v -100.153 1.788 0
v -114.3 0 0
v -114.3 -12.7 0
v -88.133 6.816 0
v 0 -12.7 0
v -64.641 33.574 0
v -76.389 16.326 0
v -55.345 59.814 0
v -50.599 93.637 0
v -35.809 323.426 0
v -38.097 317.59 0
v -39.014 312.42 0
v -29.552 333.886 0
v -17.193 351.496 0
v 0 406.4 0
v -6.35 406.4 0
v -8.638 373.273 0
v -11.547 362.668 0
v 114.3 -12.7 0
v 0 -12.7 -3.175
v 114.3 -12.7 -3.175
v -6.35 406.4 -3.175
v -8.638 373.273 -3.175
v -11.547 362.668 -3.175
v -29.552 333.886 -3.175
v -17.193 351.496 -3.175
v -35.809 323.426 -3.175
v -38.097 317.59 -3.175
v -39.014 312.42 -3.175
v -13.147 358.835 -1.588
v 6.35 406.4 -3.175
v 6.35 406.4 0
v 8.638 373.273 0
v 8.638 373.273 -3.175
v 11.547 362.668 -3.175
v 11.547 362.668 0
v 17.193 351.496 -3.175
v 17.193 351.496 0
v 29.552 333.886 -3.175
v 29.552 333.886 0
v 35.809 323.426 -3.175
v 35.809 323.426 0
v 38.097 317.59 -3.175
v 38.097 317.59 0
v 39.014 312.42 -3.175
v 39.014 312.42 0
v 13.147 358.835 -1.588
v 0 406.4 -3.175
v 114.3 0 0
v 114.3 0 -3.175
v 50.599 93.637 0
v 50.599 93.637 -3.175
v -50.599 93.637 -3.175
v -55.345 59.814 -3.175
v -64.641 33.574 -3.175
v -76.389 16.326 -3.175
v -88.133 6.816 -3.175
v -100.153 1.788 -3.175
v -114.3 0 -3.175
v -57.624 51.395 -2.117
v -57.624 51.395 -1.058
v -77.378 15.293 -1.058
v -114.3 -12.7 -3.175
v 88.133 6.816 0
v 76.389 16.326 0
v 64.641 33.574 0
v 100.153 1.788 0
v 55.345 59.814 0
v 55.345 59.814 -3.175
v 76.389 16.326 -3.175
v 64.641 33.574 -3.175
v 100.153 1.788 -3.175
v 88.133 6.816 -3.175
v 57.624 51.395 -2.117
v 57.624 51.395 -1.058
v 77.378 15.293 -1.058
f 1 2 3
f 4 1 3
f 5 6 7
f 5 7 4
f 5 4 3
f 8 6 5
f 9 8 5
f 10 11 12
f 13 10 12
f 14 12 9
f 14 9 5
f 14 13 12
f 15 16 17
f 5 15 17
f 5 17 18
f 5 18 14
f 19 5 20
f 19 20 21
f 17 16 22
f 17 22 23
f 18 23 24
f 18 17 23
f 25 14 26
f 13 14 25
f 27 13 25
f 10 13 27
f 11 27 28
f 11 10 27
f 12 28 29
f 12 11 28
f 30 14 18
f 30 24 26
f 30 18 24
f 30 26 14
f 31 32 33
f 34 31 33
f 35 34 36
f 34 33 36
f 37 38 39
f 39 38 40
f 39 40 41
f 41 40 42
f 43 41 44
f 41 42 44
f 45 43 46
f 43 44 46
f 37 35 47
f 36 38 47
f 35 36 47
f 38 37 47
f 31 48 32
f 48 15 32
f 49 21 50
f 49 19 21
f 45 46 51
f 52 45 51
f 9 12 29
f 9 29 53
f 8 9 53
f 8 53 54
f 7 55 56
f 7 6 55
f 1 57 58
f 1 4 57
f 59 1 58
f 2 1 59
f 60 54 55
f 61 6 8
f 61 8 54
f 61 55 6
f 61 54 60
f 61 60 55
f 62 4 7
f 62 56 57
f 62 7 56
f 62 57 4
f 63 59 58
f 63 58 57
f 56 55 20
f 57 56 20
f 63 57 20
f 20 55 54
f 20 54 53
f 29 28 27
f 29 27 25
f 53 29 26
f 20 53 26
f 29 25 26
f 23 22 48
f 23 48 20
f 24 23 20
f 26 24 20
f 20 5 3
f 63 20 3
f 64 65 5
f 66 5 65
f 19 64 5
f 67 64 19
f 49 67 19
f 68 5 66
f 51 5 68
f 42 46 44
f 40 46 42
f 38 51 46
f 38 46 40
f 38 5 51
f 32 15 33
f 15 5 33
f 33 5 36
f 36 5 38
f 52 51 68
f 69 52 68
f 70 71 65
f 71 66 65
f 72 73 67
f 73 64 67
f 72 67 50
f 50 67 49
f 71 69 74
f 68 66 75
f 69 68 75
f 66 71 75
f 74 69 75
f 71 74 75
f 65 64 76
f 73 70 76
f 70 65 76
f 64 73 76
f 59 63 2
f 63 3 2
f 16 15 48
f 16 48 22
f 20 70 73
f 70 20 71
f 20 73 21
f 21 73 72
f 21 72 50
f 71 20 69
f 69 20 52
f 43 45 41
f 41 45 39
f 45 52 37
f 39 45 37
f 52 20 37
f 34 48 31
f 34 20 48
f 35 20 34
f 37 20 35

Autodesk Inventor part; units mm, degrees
ref_plane "YZ Plane" through (0, 0, 0) normal (1, 0, 0) x (0, 1, 0)
ref_plane "XZ Plane" through (0, 0, 0) normal (0, 1, 0) x (-1, 0, 0)
ref_plane "XY Plane" through (0, 0, 0) normal (0, 0, 1) x (1, 0, 0)
sketch "Sketch1" plane through (0, 0, 0) normal (0, 0, 1) x (1, 0, 0)
  line L0 (76.2, -12.7) -> (381, -12.7) construction
  line L1 (-76.2, -12.7) -> (-381, -12.7) construction
  line L2 (-76.2, 0) -> (-381, 0) construction
  line L3 (76.2, 0) -> (381, 0) construction
  line L4 (0, -116.2267) -> (0, 608.4603)
  line L5 (0, -12.7) -> (-114.3, -12.7)
  line L6 (-114.3, -12.7) -> (-114.3, 0)
  line L7 (0, 406.4) -> (-6.35, 406.4)
  line L8 (-39.0138, 312.42) -> (-50.5988, 93.6374)
  line L9 (39.0138, 312.42) -> (50.5988, 93.6374)
  line L10 (0, 406.4) -> (6.35, 406.4)
  line L11 (0, -12.7) -> (114.3, -12.7)
  line L12 (114.3, -12.7) -> (114.3, 0)
  spline S0 degree 4 poles (-6.35, 406.4) (-6.35, 381.154) (-10.7035, 365.7003) (-9.9482, 354.3709) (-38.2791, 326.2946) (-39.0138, 312.42) knots 0 0 0 0 0 0.492384 1 1 1 1 1
  line L13 (-6.35, 441.1174) -> (-6.35, 371.6826) construction
  arc A0 (-7.3193, 378.694) -> (-7.3193, 434.106) centre (-402.7904, 406.4) ccw construction
  spline S1 degree 4 poles (6.35, 406.4) (6.35, 381.154) (10.7035, 365.7003) (9.9482, 354.3709) (38.2791, 326.2946) (39.0138, 312.42) knots 0 0 0 0 0 0.492384 1 1 1 1 1
  line L14 (6.35, 441.1174) -> (6.35, 371.6826) construction
  arc A1 (7.3193, 434.106) -> (7.3193, 378.694) centre (402.7904, 406.4) ccw construction
  line L15 (-8.1247, 369.9755) -> (-17.7136, 348.6922) construction
  arc A2 (-17.4133, 351.2643) -> (-9.8522, 368.0464) centre (-62.6107, 381.7218) ccw construction
  line L16 (8.1247, 369.9755) -> (17.7136, 348.6922) construction
  arc A3 (9.8522, 368.0464) -> (17.4133, 351.2643) centre (62.6107, 381.7218) ccw construction
  spline S2 degree 3 poles (-50.5988, 93.6374) (-52.7393, 53.2143) (-67.314, 0) (-114.3, 0) knots 0 0 0 0 1 1 1 1
  line L17 (-100.9407, 0) -> (-127.6593, 0) construction
  arc A4 (-124.8332, 0.8979) -> (-103.7668, 0.8979) centre (-114.3, 62.2299) ccw construction
  spline S3 degree 3 poles (50.5988, 93.6374) (52.7393, 53.2143) (67.314, 0) (114.3, 0) knots 0 0 0 0 1 1 1 1
  line L18 (100.9407, 0) -> (127.6593, 0) construction
  arc A5 (103.7668, 0.8979) -> (124.8332, 0.8979) centre (114.3, 62.2299) ccw construction
  point P0 (0, 0)
  point P1 (-12.9192, 359.3339)
  point P2 (12.9192, 359.3339)
  dimension "d3" = 114.3
  dimension "d5" = 0.7
  dimension "d6" = 0.7
  dimension "d7" = 93.98
  dimension "d8" = 12.7
  dimension "d9" = 419.1
extrude "Extrusion1" add sketch "Sketch1" against normal blind 3.175
sketch "Etching" plane through (0, 0, 0) normal (0, 0, 1) x (1, 0, 0)
  line L0 (-114.3, -12.7) -> (114.3, -12.7) projected
  line L1 (114.3, -12.7) -> (114.3, 0) projected
  line L2 (50.5988, 93.6374) -> (39.0138, 312.42) projected
  line L3 (6.35, 406.4) -> (-6.35, 406.4) projected
  line L4 (-39.0138, 312.42) -> (-50.5988, 93.6374) projected
  line L5 (-114.3, 0) -> (-114.3, -12.7) projected
  line L6 (-45.7985, 184.2911) -> (45.7985, 184.2911)
  line L7 (0, -12.7) -> (0, 406.4)
  circle A0 centre (0, 184.2911) radius 5.08
  line L8 (-47.625, 12.7) -> (47.625, 12.7) projected
  line L9 (-47.625, 0) -> (-47.625, 12.7) projected
  line L10 (47.625, 12.7) -> (47.625, 0) projected
  line L11 (-114.3, 0) -> (114.3, 0)
  line L12 (37.9166, 92.9659) -> (29.8579, 245.1527) projected
  line L13 (42.5402, 245.8242) -> (29.8579, 245.1527) projected
  line L14 (37.9166, 92.9659) -> (50.5988, 93.6374) projected
  line L15 (-50.5988, 93.6374) -> (-37.9166, 92.9659) projected
  line L16 (-37.9166, 92.9659) -> (-29.8579, 245.1527) projected
  line L17 (-29.8579, 245.1527) -> (-42.5402, 245.8242) projected
  line L18 (-6.35, 298.8732) -> (6.35, 298.8732) projected
  line L19 (-6.35, 298.8732) -> (-6.35, 406.4)
  line L20 (6.35, 298.8732) -> (6.35, 406.4)
  dimension "d10" = 10.16
equation "\"d5\" = d6"
properties part number "Bottom Plate v2" material "Wood (Cherry)"
